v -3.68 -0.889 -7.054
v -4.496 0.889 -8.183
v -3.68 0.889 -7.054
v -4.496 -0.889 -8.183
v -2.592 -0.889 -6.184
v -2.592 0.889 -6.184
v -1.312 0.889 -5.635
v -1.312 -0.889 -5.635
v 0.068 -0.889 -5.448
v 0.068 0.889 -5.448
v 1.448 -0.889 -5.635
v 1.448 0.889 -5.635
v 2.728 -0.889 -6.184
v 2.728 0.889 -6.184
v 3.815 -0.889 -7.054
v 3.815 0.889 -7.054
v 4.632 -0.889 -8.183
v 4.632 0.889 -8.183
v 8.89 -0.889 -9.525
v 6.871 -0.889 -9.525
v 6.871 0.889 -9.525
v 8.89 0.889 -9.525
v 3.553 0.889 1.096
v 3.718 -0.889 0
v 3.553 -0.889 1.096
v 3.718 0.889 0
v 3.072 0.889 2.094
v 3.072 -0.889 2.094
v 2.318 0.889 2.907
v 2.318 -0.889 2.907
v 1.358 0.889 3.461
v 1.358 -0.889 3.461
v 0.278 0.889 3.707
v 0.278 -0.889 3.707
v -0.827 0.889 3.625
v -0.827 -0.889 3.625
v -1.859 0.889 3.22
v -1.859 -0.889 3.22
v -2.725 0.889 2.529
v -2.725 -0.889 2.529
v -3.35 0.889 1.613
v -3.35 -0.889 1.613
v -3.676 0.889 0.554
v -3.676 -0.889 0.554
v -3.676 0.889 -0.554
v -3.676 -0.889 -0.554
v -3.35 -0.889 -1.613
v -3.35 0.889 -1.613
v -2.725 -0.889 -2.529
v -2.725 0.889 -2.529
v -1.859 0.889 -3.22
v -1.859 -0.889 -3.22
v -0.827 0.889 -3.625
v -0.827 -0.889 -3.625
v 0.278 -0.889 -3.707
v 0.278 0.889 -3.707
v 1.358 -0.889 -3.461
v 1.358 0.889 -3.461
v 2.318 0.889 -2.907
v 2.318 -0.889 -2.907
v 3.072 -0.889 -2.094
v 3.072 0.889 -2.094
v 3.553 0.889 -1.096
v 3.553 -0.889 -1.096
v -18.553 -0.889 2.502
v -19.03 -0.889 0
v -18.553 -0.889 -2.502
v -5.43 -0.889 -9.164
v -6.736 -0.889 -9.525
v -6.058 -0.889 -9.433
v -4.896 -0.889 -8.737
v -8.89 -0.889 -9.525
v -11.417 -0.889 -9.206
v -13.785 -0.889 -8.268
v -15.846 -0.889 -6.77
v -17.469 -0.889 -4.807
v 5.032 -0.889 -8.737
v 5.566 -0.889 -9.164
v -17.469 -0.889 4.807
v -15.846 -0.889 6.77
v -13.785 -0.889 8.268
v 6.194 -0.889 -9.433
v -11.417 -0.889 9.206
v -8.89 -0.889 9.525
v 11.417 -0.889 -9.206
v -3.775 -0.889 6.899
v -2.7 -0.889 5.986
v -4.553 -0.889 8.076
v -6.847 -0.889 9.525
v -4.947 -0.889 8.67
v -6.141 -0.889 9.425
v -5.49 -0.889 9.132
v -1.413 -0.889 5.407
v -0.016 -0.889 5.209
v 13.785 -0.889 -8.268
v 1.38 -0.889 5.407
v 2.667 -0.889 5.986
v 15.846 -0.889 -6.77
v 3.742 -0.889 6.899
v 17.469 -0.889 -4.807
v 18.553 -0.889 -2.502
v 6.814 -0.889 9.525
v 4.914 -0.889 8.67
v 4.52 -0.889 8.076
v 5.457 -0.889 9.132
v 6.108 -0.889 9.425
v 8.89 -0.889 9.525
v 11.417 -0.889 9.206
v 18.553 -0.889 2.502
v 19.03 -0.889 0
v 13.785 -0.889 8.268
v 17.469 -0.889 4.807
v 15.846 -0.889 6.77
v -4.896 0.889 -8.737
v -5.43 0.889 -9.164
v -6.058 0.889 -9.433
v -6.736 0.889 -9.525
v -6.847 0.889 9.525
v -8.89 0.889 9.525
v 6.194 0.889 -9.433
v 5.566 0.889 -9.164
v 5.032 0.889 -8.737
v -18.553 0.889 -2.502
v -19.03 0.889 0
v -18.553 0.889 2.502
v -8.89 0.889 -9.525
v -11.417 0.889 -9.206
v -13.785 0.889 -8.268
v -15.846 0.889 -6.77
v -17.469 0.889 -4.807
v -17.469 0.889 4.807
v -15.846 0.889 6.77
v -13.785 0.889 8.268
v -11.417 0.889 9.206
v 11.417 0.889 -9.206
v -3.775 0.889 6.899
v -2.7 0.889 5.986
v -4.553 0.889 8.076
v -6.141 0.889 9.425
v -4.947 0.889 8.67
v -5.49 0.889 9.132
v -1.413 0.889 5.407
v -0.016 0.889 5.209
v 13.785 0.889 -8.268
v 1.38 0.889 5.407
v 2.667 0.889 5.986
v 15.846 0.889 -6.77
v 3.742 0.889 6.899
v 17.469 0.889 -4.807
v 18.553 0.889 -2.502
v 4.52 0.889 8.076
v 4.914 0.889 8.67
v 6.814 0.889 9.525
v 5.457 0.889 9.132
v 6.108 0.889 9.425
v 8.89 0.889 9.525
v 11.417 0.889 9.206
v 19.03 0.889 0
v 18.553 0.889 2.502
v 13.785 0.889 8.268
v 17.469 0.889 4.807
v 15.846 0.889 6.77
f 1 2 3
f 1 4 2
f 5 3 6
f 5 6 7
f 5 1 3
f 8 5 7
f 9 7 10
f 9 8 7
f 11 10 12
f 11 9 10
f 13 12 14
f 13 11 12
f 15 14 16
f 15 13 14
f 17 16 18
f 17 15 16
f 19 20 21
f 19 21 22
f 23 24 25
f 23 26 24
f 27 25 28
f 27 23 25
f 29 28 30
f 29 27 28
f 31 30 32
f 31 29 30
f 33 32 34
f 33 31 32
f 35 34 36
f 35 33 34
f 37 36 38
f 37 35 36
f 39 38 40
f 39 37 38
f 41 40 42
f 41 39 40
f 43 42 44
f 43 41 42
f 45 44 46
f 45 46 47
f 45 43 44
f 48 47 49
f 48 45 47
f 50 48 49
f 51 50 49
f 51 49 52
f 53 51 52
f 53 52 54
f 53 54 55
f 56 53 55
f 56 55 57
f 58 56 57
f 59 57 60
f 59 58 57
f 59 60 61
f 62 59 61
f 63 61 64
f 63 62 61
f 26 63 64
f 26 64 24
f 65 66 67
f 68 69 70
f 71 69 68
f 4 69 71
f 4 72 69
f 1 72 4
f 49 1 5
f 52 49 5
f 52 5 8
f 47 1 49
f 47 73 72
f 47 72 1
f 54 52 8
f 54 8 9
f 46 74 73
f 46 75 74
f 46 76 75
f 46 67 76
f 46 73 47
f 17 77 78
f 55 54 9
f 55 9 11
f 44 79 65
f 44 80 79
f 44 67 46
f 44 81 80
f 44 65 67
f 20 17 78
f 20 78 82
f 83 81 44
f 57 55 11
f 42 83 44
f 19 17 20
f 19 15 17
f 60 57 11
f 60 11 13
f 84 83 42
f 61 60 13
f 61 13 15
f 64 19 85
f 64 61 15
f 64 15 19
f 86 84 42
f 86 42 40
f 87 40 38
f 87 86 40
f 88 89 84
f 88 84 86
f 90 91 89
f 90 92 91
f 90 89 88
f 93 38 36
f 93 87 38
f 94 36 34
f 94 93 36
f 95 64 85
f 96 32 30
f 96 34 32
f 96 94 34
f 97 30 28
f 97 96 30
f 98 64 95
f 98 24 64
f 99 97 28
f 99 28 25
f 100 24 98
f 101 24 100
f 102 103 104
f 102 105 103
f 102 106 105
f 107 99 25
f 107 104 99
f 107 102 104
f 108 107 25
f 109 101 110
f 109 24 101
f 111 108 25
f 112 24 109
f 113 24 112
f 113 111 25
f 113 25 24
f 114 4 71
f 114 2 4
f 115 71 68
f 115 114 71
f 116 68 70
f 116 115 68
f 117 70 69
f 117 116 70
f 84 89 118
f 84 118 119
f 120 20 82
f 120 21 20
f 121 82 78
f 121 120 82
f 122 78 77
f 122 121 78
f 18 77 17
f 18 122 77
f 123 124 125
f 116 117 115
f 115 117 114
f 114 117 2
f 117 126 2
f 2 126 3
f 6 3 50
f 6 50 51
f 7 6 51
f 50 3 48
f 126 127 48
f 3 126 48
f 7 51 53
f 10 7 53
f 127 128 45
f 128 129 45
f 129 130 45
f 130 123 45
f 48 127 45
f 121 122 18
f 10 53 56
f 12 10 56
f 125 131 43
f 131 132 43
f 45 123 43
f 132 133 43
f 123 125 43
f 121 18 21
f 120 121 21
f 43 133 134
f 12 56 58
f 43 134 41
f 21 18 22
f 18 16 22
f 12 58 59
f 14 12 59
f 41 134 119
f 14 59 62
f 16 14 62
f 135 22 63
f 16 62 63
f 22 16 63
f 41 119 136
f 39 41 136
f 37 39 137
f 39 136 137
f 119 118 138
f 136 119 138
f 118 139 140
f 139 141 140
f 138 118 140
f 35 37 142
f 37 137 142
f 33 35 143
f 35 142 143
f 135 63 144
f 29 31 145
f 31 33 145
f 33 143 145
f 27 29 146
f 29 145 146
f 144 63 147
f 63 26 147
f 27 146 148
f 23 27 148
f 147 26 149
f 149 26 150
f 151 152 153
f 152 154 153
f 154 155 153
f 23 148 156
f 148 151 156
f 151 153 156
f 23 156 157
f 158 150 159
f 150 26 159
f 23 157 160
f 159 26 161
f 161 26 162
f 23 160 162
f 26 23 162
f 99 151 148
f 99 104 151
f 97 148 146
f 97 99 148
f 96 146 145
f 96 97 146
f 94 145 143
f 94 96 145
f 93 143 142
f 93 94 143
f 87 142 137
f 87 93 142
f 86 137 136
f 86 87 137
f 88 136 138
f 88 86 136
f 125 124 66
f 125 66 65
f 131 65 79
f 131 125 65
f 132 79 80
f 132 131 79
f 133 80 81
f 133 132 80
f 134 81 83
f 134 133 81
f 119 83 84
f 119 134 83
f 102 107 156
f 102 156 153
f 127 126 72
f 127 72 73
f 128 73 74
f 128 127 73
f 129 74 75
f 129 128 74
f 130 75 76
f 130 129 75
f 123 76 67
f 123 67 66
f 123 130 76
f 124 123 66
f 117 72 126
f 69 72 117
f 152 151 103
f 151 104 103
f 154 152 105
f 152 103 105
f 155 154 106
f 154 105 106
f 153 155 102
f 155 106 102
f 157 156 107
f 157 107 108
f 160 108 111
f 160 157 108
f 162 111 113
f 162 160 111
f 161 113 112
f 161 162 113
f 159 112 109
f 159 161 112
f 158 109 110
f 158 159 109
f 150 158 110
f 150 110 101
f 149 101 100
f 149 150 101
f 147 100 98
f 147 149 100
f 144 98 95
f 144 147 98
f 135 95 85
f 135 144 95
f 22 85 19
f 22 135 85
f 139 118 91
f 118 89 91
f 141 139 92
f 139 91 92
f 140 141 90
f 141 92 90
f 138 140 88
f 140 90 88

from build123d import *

# Parameters (mm, degrees)
F0_R        = 3.7178453792
F1_DEPTH    = 0.889
F2_T1_DEPTH = 52.578
F3_R        = 2.54


# Not quite as in the source:
# - a fillet or chamfer that OpenCascade refuses, or shapes differently, is made with other operations: its cross-section is extruded or revolved along the edge and cut away or added


with BuildPart() as f1:
    # F0 (on Front) → F1 (new body, symmetric)
    with BuildSketch(Plane.XZ):
        with BuildLine():
            Line((19.05, -9.525), (19.05, 9.525))
            Line((19.05, 9.525), (4.9566612579, 9.525))
            ThreePointArc((4.9566612579, 9.525), (-0.016463222, 5.2090361219), (-4.9895877019, 9.525))
            Line((-4.9895877019, 9.525), (-19.05, 9.525))
            Line((-19.05, 9.525), (-19.05, -9.525))
            Line((-19.05, -9.525), (-4.9895877019, -9.525))
            ThreePointArc((-4.9895877019, -9.525), (0.067827059, -5.4479951467), (5.1252418198, -9.525))
            Line((5.1252418198, -9.525), (19.05, -9.525))
        make_face()
        Circle(F0_R, mode=Mode.SUBTRACT)
    extrude(amount=F1_DEPTH, both=True)

    # F2: fillet of radius 10.16 on 4 edges, made by hand

    # F2_s2 → F2_t1 (cut)
    with BuildSketch(Plane.XZ.offset(-26.289)):
        with BuildLine():
            ThreePointArc((-19.05, -0.635), (-16.0742048969, 6.5492048969), (-8.89, 9.525))
            Line((-8.89, 9.525), (-19.05, 9.525))
            Line((-19.05, 9.525), (-19.05, -0.635))
        make_face()
        with BuildLine():
            ThreePointArc((-8.89, -9.525), (-16.0742048969, -6.5492048969), (-19.05, 0.635))
            Line((-19.05, 0.635), (-19.05, -9.525))
            Line((-19.05, -9.525), (-8.89, -9.525))
        make_face()
        with BuildLine():
            ThreePointArc((8.89, 9.525), (16.0742048969, 6.5492048969), (19.05, -0.635))
            Line((19.05, -0.635), (19.05, 9.525))
            Line((19.05, 9.525), (8.89, 9.525))
        make_face()
        with BuildLine():
            ThreePointArc((19.05, 0.635), (16.0742048969, -6.5492048969), (8.89, -9.525))
            Line((8.89, -9.525), (19.05, -9.525))
            Line((19.05, -9.525), (19.05, 0.635))
        make_face()
    extrude(amount=F2_T1_DEPTH, mode=Mode.SUBTRACT)

    # F3
    f3_edges = [f1.edges().sort_by_distance(p)[0] for p in [
        (-4.989588, 0, 9.525),
        (5.125242, 0, -9.525),
        (-4.989588, 0, -9.525),
        (4.956661, 0, 9.525),
    ]]
    fillet(f3_edges, radius=F3_R)


solid = f1.part
